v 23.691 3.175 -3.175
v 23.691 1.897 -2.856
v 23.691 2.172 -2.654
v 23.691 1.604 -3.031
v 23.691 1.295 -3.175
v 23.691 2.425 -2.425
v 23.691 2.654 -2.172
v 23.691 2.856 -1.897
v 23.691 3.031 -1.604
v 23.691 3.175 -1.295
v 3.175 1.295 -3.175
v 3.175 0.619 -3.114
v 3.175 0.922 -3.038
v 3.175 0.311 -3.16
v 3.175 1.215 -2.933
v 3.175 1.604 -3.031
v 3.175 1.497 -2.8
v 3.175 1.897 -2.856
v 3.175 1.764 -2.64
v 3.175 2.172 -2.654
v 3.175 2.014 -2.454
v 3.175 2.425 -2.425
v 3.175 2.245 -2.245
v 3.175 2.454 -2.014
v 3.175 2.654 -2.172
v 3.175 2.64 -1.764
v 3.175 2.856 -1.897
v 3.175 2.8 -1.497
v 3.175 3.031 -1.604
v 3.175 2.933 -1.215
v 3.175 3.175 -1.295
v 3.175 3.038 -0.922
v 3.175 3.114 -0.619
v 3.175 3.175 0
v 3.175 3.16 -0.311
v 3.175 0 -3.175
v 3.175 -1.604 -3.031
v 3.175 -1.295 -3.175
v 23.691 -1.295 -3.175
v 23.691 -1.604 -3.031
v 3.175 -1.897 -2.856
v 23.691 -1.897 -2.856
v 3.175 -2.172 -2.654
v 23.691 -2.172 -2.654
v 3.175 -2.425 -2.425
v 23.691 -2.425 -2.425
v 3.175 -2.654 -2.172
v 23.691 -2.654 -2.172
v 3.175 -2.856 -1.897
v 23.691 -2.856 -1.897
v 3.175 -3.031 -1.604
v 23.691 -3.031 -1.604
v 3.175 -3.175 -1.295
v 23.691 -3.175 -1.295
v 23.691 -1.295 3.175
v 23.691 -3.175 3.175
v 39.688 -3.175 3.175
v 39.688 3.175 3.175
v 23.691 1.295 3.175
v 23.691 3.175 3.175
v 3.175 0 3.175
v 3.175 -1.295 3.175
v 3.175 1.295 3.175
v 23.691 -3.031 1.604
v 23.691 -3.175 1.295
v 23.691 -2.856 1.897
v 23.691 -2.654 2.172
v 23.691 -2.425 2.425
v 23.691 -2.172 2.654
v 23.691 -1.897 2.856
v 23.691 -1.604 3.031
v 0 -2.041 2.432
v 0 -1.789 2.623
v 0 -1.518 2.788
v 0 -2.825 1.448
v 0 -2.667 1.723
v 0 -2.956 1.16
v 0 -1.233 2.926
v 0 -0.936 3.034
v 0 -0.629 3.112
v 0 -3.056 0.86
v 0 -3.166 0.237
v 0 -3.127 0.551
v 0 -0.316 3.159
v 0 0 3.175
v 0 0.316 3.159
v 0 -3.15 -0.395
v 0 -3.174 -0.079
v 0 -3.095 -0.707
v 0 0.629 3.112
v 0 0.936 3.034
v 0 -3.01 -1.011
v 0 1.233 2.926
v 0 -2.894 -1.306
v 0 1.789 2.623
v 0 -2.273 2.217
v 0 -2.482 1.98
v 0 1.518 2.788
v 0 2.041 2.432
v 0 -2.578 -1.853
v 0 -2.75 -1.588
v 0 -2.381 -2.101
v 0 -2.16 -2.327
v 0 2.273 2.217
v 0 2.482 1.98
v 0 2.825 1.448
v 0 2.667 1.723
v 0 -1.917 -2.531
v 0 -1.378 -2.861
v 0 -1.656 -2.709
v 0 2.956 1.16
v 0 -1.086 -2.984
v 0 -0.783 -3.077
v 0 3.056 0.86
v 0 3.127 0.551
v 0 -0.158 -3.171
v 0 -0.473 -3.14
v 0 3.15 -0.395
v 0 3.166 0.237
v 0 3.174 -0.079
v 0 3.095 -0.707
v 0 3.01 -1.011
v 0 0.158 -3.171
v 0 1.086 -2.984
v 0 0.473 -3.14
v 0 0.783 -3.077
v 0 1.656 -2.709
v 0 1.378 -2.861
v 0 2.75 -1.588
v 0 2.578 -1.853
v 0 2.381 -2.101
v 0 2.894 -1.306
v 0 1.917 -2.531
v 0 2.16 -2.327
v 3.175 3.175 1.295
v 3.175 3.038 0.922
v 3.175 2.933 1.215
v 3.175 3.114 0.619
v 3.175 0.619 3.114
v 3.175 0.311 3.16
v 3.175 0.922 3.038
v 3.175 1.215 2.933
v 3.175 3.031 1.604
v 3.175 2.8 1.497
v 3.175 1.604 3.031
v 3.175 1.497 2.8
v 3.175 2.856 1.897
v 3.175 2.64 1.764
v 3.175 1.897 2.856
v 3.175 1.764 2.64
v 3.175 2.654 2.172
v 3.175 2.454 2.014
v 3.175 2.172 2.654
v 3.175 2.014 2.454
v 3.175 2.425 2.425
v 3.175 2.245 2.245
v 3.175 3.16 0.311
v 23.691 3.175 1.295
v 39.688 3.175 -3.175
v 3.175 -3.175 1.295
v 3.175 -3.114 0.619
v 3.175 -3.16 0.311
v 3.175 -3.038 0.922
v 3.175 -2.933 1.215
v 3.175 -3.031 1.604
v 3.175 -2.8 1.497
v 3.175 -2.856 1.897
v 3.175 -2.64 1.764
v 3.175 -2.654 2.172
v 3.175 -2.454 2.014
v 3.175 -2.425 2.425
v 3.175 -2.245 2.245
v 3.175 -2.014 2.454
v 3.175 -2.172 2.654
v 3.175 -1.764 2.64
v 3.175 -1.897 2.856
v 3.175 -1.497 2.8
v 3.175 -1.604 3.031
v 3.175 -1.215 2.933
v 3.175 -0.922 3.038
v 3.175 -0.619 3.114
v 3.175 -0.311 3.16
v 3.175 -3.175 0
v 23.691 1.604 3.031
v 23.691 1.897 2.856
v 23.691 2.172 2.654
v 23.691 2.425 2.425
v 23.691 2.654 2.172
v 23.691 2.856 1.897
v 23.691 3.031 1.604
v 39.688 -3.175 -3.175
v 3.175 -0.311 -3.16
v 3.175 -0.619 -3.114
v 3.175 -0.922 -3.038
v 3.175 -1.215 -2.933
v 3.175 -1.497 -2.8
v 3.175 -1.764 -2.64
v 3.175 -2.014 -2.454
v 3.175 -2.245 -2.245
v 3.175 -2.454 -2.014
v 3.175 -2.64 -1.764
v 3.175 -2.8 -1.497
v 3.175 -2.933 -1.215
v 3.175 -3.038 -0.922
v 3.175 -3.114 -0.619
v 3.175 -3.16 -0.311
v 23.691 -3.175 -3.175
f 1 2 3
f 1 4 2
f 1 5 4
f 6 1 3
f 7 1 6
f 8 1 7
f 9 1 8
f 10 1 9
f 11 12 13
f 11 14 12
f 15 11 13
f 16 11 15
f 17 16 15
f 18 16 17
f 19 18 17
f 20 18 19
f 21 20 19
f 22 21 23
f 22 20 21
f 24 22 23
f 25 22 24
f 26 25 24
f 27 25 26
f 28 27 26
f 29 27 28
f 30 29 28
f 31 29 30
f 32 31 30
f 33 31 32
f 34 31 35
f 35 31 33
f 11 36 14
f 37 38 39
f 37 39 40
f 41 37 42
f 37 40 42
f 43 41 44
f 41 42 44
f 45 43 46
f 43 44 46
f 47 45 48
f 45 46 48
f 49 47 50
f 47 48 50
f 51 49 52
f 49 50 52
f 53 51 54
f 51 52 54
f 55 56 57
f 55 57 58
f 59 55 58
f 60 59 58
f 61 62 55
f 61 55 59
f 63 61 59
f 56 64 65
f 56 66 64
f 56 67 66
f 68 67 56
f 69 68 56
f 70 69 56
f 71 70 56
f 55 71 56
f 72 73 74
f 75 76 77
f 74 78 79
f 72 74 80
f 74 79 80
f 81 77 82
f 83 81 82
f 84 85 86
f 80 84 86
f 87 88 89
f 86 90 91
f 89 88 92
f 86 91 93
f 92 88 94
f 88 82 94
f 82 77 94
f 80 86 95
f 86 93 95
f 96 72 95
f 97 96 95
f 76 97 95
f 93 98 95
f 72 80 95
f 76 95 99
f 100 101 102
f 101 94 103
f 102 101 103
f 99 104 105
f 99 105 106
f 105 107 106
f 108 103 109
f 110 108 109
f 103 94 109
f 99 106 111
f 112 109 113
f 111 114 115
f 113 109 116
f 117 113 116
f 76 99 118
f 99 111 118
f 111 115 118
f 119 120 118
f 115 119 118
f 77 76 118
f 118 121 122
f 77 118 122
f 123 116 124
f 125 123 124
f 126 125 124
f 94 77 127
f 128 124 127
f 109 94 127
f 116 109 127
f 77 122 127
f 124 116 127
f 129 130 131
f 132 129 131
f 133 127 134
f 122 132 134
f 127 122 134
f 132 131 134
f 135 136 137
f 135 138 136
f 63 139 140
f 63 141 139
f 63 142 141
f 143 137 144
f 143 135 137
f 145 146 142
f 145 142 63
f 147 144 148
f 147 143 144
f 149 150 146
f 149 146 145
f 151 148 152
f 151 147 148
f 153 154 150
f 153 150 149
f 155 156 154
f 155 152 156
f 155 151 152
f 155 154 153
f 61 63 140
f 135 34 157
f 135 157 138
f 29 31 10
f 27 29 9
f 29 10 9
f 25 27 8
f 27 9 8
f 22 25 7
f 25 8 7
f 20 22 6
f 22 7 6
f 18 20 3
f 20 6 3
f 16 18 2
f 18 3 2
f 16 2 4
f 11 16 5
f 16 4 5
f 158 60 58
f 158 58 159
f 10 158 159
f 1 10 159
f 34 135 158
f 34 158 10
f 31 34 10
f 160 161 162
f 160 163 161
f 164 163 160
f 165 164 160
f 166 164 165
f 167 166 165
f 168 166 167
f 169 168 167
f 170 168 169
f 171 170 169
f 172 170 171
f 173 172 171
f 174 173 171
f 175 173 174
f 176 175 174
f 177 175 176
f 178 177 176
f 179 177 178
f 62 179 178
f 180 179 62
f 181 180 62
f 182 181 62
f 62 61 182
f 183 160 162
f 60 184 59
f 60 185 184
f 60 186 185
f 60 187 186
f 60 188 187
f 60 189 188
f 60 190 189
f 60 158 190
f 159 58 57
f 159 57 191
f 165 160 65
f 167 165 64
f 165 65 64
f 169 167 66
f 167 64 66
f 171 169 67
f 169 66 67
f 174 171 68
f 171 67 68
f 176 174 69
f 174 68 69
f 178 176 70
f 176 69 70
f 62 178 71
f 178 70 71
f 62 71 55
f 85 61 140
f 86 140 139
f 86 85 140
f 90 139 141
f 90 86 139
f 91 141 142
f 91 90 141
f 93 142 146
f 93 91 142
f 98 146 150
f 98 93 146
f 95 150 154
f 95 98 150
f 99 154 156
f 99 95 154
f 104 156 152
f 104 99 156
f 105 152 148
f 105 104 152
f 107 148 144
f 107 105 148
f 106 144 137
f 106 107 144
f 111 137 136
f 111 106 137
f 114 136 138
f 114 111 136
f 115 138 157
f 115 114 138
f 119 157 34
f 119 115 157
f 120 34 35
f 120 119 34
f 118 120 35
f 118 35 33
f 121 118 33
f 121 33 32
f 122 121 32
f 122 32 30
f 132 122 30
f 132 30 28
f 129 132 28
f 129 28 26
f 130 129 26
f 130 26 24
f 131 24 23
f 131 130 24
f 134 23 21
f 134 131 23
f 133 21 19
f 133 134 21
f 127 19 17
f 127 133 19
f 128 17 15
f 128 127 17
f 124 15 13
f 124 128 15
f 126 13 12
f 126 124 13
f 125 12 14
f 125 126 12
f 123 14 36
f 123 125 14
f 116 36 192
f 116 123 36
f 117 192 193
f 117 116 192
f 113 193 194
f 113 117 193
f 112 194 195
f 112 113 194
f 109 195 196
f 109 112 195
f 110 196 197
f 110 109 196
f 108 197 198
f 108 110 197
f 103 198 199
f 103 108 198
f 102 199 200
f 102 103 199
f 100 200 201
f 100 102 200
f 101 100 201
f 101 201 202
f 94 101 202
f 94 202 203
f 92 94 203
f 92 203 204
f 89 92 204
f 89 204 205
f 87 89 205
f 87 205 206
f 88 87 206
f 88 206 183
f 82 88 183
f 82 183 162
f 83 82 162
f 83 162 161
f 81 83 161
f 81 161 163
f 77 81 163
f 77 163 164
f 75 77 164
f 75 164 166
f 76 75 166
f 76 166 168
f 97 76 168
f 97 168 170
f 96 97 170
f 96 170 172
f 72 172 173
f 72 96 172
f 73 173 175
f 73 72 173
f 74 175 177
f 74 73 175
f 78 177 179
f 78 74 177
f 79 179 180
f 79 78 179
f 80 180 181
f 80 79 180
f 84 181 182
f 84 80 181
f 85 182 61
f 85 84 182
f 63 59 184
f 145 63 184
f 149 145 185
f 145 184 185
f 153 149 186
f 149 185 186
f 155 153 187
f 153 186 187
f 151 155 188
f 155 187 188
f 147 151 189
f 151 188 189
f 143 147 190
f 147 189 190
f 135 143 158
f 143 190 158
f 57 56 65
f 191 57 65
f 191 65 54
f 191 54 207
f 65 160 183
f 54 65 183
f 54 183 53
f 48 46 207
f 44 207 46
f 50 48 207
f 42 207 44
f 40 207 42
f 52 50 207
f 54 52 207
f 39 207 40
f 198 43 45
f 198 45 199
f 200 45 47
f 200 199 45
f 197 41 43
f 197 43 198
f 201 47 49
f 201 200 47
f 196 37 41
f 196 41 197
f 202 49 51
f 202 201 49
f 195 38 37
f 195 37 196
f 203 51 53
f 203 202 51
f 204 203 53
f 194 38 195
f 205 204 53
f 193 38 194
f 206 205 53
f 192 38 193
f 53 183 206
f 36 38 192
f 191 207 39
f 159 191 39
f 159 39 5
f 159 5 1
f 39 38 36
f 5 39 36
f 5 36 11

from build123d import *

# Parameters (mm, degrees)
SKETCH1_W           = 6.35
SKETCH1_H           = 6.35
BOSS_EXTRUDE1_DEPTH = 39.6875
SKETCH4_W           = 11.064537346
SKETCH4_H           = 8.106256658
SKETCH4_R           = 3.175
CUT_EXTRUDE3_DEPTH  = 3.175
CUT_EXTRUDE4_START  = -20.515625
SKETCH5_W           = 9.216364604
SKETCH5_H           = 9.38217528
SKETCH5_R           = 3.429
CUT_EXTRUDE4_DEPTH  = 20.515625


with BuildPart() as part:
    # Sketch1 → Boss-Extrude1 (new body)
    with BuildSketch(Plane(origin=(0, 0, 0), x_dir=(0, 0, -1), z_dir=(1, 0, 0))):
        Rectangle(SKETCH1_W, SKETCH1_H)
    extrude(amount=BOSS_EXTRUDE1_DEPTH)

    # Sketch4 → Cut-Extrude3 (cut)
    with BuildSketch(Plane.ZY):
        Rectangle(SKETCH4_W, SKETCH4_H)
        Circle(SKETCH4_R, mode=Mode.SUBTRACT)
    extrude(amount=-CUT_EXTRUDE3_DEPTH, mode=Mode.SUBTRACT)

    # Sketch5 → Cut-Extrude4 (cut)
    with BuildSketch(Plane.ZY.offset(-3.175).offset(CUT_EXTRUDE4_START)):
        Rectangle(SKETCH5_W, SKETCH5_H)
        Circle(SKETCH5_R, mode=Mode.SUBTRACT)
    extrude(amount=CUT_EXTRUDE4_DEPTH, mode=Mode.SUBTRACT)


solid = part.part
